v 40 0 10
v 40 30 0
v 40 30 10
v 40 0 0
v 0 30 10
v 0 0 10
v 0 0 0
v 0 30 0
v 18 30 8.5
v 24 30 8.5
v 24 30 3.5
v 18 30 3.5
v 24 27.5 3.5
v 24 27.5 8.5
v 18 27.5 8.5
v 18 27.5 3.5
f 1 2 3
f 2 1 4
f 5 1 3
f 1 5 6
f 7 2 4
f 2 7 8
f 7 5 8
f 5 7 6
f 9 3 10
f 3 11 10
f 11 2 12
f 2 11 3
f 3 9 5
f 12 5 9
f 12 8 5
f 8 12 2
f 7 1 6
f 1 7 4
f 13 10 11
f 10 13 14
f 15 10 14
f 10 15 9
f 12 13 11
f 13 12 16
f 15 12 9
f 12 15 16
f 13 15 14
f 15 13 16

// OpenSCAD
// units=mm — generated by scad_emitter.py
// part=unnamed
$fn = 48;

difference() { cube([40, 30, 10]); translate([18, 27.5, 3.5]) cube([6, 3, 5]); }
